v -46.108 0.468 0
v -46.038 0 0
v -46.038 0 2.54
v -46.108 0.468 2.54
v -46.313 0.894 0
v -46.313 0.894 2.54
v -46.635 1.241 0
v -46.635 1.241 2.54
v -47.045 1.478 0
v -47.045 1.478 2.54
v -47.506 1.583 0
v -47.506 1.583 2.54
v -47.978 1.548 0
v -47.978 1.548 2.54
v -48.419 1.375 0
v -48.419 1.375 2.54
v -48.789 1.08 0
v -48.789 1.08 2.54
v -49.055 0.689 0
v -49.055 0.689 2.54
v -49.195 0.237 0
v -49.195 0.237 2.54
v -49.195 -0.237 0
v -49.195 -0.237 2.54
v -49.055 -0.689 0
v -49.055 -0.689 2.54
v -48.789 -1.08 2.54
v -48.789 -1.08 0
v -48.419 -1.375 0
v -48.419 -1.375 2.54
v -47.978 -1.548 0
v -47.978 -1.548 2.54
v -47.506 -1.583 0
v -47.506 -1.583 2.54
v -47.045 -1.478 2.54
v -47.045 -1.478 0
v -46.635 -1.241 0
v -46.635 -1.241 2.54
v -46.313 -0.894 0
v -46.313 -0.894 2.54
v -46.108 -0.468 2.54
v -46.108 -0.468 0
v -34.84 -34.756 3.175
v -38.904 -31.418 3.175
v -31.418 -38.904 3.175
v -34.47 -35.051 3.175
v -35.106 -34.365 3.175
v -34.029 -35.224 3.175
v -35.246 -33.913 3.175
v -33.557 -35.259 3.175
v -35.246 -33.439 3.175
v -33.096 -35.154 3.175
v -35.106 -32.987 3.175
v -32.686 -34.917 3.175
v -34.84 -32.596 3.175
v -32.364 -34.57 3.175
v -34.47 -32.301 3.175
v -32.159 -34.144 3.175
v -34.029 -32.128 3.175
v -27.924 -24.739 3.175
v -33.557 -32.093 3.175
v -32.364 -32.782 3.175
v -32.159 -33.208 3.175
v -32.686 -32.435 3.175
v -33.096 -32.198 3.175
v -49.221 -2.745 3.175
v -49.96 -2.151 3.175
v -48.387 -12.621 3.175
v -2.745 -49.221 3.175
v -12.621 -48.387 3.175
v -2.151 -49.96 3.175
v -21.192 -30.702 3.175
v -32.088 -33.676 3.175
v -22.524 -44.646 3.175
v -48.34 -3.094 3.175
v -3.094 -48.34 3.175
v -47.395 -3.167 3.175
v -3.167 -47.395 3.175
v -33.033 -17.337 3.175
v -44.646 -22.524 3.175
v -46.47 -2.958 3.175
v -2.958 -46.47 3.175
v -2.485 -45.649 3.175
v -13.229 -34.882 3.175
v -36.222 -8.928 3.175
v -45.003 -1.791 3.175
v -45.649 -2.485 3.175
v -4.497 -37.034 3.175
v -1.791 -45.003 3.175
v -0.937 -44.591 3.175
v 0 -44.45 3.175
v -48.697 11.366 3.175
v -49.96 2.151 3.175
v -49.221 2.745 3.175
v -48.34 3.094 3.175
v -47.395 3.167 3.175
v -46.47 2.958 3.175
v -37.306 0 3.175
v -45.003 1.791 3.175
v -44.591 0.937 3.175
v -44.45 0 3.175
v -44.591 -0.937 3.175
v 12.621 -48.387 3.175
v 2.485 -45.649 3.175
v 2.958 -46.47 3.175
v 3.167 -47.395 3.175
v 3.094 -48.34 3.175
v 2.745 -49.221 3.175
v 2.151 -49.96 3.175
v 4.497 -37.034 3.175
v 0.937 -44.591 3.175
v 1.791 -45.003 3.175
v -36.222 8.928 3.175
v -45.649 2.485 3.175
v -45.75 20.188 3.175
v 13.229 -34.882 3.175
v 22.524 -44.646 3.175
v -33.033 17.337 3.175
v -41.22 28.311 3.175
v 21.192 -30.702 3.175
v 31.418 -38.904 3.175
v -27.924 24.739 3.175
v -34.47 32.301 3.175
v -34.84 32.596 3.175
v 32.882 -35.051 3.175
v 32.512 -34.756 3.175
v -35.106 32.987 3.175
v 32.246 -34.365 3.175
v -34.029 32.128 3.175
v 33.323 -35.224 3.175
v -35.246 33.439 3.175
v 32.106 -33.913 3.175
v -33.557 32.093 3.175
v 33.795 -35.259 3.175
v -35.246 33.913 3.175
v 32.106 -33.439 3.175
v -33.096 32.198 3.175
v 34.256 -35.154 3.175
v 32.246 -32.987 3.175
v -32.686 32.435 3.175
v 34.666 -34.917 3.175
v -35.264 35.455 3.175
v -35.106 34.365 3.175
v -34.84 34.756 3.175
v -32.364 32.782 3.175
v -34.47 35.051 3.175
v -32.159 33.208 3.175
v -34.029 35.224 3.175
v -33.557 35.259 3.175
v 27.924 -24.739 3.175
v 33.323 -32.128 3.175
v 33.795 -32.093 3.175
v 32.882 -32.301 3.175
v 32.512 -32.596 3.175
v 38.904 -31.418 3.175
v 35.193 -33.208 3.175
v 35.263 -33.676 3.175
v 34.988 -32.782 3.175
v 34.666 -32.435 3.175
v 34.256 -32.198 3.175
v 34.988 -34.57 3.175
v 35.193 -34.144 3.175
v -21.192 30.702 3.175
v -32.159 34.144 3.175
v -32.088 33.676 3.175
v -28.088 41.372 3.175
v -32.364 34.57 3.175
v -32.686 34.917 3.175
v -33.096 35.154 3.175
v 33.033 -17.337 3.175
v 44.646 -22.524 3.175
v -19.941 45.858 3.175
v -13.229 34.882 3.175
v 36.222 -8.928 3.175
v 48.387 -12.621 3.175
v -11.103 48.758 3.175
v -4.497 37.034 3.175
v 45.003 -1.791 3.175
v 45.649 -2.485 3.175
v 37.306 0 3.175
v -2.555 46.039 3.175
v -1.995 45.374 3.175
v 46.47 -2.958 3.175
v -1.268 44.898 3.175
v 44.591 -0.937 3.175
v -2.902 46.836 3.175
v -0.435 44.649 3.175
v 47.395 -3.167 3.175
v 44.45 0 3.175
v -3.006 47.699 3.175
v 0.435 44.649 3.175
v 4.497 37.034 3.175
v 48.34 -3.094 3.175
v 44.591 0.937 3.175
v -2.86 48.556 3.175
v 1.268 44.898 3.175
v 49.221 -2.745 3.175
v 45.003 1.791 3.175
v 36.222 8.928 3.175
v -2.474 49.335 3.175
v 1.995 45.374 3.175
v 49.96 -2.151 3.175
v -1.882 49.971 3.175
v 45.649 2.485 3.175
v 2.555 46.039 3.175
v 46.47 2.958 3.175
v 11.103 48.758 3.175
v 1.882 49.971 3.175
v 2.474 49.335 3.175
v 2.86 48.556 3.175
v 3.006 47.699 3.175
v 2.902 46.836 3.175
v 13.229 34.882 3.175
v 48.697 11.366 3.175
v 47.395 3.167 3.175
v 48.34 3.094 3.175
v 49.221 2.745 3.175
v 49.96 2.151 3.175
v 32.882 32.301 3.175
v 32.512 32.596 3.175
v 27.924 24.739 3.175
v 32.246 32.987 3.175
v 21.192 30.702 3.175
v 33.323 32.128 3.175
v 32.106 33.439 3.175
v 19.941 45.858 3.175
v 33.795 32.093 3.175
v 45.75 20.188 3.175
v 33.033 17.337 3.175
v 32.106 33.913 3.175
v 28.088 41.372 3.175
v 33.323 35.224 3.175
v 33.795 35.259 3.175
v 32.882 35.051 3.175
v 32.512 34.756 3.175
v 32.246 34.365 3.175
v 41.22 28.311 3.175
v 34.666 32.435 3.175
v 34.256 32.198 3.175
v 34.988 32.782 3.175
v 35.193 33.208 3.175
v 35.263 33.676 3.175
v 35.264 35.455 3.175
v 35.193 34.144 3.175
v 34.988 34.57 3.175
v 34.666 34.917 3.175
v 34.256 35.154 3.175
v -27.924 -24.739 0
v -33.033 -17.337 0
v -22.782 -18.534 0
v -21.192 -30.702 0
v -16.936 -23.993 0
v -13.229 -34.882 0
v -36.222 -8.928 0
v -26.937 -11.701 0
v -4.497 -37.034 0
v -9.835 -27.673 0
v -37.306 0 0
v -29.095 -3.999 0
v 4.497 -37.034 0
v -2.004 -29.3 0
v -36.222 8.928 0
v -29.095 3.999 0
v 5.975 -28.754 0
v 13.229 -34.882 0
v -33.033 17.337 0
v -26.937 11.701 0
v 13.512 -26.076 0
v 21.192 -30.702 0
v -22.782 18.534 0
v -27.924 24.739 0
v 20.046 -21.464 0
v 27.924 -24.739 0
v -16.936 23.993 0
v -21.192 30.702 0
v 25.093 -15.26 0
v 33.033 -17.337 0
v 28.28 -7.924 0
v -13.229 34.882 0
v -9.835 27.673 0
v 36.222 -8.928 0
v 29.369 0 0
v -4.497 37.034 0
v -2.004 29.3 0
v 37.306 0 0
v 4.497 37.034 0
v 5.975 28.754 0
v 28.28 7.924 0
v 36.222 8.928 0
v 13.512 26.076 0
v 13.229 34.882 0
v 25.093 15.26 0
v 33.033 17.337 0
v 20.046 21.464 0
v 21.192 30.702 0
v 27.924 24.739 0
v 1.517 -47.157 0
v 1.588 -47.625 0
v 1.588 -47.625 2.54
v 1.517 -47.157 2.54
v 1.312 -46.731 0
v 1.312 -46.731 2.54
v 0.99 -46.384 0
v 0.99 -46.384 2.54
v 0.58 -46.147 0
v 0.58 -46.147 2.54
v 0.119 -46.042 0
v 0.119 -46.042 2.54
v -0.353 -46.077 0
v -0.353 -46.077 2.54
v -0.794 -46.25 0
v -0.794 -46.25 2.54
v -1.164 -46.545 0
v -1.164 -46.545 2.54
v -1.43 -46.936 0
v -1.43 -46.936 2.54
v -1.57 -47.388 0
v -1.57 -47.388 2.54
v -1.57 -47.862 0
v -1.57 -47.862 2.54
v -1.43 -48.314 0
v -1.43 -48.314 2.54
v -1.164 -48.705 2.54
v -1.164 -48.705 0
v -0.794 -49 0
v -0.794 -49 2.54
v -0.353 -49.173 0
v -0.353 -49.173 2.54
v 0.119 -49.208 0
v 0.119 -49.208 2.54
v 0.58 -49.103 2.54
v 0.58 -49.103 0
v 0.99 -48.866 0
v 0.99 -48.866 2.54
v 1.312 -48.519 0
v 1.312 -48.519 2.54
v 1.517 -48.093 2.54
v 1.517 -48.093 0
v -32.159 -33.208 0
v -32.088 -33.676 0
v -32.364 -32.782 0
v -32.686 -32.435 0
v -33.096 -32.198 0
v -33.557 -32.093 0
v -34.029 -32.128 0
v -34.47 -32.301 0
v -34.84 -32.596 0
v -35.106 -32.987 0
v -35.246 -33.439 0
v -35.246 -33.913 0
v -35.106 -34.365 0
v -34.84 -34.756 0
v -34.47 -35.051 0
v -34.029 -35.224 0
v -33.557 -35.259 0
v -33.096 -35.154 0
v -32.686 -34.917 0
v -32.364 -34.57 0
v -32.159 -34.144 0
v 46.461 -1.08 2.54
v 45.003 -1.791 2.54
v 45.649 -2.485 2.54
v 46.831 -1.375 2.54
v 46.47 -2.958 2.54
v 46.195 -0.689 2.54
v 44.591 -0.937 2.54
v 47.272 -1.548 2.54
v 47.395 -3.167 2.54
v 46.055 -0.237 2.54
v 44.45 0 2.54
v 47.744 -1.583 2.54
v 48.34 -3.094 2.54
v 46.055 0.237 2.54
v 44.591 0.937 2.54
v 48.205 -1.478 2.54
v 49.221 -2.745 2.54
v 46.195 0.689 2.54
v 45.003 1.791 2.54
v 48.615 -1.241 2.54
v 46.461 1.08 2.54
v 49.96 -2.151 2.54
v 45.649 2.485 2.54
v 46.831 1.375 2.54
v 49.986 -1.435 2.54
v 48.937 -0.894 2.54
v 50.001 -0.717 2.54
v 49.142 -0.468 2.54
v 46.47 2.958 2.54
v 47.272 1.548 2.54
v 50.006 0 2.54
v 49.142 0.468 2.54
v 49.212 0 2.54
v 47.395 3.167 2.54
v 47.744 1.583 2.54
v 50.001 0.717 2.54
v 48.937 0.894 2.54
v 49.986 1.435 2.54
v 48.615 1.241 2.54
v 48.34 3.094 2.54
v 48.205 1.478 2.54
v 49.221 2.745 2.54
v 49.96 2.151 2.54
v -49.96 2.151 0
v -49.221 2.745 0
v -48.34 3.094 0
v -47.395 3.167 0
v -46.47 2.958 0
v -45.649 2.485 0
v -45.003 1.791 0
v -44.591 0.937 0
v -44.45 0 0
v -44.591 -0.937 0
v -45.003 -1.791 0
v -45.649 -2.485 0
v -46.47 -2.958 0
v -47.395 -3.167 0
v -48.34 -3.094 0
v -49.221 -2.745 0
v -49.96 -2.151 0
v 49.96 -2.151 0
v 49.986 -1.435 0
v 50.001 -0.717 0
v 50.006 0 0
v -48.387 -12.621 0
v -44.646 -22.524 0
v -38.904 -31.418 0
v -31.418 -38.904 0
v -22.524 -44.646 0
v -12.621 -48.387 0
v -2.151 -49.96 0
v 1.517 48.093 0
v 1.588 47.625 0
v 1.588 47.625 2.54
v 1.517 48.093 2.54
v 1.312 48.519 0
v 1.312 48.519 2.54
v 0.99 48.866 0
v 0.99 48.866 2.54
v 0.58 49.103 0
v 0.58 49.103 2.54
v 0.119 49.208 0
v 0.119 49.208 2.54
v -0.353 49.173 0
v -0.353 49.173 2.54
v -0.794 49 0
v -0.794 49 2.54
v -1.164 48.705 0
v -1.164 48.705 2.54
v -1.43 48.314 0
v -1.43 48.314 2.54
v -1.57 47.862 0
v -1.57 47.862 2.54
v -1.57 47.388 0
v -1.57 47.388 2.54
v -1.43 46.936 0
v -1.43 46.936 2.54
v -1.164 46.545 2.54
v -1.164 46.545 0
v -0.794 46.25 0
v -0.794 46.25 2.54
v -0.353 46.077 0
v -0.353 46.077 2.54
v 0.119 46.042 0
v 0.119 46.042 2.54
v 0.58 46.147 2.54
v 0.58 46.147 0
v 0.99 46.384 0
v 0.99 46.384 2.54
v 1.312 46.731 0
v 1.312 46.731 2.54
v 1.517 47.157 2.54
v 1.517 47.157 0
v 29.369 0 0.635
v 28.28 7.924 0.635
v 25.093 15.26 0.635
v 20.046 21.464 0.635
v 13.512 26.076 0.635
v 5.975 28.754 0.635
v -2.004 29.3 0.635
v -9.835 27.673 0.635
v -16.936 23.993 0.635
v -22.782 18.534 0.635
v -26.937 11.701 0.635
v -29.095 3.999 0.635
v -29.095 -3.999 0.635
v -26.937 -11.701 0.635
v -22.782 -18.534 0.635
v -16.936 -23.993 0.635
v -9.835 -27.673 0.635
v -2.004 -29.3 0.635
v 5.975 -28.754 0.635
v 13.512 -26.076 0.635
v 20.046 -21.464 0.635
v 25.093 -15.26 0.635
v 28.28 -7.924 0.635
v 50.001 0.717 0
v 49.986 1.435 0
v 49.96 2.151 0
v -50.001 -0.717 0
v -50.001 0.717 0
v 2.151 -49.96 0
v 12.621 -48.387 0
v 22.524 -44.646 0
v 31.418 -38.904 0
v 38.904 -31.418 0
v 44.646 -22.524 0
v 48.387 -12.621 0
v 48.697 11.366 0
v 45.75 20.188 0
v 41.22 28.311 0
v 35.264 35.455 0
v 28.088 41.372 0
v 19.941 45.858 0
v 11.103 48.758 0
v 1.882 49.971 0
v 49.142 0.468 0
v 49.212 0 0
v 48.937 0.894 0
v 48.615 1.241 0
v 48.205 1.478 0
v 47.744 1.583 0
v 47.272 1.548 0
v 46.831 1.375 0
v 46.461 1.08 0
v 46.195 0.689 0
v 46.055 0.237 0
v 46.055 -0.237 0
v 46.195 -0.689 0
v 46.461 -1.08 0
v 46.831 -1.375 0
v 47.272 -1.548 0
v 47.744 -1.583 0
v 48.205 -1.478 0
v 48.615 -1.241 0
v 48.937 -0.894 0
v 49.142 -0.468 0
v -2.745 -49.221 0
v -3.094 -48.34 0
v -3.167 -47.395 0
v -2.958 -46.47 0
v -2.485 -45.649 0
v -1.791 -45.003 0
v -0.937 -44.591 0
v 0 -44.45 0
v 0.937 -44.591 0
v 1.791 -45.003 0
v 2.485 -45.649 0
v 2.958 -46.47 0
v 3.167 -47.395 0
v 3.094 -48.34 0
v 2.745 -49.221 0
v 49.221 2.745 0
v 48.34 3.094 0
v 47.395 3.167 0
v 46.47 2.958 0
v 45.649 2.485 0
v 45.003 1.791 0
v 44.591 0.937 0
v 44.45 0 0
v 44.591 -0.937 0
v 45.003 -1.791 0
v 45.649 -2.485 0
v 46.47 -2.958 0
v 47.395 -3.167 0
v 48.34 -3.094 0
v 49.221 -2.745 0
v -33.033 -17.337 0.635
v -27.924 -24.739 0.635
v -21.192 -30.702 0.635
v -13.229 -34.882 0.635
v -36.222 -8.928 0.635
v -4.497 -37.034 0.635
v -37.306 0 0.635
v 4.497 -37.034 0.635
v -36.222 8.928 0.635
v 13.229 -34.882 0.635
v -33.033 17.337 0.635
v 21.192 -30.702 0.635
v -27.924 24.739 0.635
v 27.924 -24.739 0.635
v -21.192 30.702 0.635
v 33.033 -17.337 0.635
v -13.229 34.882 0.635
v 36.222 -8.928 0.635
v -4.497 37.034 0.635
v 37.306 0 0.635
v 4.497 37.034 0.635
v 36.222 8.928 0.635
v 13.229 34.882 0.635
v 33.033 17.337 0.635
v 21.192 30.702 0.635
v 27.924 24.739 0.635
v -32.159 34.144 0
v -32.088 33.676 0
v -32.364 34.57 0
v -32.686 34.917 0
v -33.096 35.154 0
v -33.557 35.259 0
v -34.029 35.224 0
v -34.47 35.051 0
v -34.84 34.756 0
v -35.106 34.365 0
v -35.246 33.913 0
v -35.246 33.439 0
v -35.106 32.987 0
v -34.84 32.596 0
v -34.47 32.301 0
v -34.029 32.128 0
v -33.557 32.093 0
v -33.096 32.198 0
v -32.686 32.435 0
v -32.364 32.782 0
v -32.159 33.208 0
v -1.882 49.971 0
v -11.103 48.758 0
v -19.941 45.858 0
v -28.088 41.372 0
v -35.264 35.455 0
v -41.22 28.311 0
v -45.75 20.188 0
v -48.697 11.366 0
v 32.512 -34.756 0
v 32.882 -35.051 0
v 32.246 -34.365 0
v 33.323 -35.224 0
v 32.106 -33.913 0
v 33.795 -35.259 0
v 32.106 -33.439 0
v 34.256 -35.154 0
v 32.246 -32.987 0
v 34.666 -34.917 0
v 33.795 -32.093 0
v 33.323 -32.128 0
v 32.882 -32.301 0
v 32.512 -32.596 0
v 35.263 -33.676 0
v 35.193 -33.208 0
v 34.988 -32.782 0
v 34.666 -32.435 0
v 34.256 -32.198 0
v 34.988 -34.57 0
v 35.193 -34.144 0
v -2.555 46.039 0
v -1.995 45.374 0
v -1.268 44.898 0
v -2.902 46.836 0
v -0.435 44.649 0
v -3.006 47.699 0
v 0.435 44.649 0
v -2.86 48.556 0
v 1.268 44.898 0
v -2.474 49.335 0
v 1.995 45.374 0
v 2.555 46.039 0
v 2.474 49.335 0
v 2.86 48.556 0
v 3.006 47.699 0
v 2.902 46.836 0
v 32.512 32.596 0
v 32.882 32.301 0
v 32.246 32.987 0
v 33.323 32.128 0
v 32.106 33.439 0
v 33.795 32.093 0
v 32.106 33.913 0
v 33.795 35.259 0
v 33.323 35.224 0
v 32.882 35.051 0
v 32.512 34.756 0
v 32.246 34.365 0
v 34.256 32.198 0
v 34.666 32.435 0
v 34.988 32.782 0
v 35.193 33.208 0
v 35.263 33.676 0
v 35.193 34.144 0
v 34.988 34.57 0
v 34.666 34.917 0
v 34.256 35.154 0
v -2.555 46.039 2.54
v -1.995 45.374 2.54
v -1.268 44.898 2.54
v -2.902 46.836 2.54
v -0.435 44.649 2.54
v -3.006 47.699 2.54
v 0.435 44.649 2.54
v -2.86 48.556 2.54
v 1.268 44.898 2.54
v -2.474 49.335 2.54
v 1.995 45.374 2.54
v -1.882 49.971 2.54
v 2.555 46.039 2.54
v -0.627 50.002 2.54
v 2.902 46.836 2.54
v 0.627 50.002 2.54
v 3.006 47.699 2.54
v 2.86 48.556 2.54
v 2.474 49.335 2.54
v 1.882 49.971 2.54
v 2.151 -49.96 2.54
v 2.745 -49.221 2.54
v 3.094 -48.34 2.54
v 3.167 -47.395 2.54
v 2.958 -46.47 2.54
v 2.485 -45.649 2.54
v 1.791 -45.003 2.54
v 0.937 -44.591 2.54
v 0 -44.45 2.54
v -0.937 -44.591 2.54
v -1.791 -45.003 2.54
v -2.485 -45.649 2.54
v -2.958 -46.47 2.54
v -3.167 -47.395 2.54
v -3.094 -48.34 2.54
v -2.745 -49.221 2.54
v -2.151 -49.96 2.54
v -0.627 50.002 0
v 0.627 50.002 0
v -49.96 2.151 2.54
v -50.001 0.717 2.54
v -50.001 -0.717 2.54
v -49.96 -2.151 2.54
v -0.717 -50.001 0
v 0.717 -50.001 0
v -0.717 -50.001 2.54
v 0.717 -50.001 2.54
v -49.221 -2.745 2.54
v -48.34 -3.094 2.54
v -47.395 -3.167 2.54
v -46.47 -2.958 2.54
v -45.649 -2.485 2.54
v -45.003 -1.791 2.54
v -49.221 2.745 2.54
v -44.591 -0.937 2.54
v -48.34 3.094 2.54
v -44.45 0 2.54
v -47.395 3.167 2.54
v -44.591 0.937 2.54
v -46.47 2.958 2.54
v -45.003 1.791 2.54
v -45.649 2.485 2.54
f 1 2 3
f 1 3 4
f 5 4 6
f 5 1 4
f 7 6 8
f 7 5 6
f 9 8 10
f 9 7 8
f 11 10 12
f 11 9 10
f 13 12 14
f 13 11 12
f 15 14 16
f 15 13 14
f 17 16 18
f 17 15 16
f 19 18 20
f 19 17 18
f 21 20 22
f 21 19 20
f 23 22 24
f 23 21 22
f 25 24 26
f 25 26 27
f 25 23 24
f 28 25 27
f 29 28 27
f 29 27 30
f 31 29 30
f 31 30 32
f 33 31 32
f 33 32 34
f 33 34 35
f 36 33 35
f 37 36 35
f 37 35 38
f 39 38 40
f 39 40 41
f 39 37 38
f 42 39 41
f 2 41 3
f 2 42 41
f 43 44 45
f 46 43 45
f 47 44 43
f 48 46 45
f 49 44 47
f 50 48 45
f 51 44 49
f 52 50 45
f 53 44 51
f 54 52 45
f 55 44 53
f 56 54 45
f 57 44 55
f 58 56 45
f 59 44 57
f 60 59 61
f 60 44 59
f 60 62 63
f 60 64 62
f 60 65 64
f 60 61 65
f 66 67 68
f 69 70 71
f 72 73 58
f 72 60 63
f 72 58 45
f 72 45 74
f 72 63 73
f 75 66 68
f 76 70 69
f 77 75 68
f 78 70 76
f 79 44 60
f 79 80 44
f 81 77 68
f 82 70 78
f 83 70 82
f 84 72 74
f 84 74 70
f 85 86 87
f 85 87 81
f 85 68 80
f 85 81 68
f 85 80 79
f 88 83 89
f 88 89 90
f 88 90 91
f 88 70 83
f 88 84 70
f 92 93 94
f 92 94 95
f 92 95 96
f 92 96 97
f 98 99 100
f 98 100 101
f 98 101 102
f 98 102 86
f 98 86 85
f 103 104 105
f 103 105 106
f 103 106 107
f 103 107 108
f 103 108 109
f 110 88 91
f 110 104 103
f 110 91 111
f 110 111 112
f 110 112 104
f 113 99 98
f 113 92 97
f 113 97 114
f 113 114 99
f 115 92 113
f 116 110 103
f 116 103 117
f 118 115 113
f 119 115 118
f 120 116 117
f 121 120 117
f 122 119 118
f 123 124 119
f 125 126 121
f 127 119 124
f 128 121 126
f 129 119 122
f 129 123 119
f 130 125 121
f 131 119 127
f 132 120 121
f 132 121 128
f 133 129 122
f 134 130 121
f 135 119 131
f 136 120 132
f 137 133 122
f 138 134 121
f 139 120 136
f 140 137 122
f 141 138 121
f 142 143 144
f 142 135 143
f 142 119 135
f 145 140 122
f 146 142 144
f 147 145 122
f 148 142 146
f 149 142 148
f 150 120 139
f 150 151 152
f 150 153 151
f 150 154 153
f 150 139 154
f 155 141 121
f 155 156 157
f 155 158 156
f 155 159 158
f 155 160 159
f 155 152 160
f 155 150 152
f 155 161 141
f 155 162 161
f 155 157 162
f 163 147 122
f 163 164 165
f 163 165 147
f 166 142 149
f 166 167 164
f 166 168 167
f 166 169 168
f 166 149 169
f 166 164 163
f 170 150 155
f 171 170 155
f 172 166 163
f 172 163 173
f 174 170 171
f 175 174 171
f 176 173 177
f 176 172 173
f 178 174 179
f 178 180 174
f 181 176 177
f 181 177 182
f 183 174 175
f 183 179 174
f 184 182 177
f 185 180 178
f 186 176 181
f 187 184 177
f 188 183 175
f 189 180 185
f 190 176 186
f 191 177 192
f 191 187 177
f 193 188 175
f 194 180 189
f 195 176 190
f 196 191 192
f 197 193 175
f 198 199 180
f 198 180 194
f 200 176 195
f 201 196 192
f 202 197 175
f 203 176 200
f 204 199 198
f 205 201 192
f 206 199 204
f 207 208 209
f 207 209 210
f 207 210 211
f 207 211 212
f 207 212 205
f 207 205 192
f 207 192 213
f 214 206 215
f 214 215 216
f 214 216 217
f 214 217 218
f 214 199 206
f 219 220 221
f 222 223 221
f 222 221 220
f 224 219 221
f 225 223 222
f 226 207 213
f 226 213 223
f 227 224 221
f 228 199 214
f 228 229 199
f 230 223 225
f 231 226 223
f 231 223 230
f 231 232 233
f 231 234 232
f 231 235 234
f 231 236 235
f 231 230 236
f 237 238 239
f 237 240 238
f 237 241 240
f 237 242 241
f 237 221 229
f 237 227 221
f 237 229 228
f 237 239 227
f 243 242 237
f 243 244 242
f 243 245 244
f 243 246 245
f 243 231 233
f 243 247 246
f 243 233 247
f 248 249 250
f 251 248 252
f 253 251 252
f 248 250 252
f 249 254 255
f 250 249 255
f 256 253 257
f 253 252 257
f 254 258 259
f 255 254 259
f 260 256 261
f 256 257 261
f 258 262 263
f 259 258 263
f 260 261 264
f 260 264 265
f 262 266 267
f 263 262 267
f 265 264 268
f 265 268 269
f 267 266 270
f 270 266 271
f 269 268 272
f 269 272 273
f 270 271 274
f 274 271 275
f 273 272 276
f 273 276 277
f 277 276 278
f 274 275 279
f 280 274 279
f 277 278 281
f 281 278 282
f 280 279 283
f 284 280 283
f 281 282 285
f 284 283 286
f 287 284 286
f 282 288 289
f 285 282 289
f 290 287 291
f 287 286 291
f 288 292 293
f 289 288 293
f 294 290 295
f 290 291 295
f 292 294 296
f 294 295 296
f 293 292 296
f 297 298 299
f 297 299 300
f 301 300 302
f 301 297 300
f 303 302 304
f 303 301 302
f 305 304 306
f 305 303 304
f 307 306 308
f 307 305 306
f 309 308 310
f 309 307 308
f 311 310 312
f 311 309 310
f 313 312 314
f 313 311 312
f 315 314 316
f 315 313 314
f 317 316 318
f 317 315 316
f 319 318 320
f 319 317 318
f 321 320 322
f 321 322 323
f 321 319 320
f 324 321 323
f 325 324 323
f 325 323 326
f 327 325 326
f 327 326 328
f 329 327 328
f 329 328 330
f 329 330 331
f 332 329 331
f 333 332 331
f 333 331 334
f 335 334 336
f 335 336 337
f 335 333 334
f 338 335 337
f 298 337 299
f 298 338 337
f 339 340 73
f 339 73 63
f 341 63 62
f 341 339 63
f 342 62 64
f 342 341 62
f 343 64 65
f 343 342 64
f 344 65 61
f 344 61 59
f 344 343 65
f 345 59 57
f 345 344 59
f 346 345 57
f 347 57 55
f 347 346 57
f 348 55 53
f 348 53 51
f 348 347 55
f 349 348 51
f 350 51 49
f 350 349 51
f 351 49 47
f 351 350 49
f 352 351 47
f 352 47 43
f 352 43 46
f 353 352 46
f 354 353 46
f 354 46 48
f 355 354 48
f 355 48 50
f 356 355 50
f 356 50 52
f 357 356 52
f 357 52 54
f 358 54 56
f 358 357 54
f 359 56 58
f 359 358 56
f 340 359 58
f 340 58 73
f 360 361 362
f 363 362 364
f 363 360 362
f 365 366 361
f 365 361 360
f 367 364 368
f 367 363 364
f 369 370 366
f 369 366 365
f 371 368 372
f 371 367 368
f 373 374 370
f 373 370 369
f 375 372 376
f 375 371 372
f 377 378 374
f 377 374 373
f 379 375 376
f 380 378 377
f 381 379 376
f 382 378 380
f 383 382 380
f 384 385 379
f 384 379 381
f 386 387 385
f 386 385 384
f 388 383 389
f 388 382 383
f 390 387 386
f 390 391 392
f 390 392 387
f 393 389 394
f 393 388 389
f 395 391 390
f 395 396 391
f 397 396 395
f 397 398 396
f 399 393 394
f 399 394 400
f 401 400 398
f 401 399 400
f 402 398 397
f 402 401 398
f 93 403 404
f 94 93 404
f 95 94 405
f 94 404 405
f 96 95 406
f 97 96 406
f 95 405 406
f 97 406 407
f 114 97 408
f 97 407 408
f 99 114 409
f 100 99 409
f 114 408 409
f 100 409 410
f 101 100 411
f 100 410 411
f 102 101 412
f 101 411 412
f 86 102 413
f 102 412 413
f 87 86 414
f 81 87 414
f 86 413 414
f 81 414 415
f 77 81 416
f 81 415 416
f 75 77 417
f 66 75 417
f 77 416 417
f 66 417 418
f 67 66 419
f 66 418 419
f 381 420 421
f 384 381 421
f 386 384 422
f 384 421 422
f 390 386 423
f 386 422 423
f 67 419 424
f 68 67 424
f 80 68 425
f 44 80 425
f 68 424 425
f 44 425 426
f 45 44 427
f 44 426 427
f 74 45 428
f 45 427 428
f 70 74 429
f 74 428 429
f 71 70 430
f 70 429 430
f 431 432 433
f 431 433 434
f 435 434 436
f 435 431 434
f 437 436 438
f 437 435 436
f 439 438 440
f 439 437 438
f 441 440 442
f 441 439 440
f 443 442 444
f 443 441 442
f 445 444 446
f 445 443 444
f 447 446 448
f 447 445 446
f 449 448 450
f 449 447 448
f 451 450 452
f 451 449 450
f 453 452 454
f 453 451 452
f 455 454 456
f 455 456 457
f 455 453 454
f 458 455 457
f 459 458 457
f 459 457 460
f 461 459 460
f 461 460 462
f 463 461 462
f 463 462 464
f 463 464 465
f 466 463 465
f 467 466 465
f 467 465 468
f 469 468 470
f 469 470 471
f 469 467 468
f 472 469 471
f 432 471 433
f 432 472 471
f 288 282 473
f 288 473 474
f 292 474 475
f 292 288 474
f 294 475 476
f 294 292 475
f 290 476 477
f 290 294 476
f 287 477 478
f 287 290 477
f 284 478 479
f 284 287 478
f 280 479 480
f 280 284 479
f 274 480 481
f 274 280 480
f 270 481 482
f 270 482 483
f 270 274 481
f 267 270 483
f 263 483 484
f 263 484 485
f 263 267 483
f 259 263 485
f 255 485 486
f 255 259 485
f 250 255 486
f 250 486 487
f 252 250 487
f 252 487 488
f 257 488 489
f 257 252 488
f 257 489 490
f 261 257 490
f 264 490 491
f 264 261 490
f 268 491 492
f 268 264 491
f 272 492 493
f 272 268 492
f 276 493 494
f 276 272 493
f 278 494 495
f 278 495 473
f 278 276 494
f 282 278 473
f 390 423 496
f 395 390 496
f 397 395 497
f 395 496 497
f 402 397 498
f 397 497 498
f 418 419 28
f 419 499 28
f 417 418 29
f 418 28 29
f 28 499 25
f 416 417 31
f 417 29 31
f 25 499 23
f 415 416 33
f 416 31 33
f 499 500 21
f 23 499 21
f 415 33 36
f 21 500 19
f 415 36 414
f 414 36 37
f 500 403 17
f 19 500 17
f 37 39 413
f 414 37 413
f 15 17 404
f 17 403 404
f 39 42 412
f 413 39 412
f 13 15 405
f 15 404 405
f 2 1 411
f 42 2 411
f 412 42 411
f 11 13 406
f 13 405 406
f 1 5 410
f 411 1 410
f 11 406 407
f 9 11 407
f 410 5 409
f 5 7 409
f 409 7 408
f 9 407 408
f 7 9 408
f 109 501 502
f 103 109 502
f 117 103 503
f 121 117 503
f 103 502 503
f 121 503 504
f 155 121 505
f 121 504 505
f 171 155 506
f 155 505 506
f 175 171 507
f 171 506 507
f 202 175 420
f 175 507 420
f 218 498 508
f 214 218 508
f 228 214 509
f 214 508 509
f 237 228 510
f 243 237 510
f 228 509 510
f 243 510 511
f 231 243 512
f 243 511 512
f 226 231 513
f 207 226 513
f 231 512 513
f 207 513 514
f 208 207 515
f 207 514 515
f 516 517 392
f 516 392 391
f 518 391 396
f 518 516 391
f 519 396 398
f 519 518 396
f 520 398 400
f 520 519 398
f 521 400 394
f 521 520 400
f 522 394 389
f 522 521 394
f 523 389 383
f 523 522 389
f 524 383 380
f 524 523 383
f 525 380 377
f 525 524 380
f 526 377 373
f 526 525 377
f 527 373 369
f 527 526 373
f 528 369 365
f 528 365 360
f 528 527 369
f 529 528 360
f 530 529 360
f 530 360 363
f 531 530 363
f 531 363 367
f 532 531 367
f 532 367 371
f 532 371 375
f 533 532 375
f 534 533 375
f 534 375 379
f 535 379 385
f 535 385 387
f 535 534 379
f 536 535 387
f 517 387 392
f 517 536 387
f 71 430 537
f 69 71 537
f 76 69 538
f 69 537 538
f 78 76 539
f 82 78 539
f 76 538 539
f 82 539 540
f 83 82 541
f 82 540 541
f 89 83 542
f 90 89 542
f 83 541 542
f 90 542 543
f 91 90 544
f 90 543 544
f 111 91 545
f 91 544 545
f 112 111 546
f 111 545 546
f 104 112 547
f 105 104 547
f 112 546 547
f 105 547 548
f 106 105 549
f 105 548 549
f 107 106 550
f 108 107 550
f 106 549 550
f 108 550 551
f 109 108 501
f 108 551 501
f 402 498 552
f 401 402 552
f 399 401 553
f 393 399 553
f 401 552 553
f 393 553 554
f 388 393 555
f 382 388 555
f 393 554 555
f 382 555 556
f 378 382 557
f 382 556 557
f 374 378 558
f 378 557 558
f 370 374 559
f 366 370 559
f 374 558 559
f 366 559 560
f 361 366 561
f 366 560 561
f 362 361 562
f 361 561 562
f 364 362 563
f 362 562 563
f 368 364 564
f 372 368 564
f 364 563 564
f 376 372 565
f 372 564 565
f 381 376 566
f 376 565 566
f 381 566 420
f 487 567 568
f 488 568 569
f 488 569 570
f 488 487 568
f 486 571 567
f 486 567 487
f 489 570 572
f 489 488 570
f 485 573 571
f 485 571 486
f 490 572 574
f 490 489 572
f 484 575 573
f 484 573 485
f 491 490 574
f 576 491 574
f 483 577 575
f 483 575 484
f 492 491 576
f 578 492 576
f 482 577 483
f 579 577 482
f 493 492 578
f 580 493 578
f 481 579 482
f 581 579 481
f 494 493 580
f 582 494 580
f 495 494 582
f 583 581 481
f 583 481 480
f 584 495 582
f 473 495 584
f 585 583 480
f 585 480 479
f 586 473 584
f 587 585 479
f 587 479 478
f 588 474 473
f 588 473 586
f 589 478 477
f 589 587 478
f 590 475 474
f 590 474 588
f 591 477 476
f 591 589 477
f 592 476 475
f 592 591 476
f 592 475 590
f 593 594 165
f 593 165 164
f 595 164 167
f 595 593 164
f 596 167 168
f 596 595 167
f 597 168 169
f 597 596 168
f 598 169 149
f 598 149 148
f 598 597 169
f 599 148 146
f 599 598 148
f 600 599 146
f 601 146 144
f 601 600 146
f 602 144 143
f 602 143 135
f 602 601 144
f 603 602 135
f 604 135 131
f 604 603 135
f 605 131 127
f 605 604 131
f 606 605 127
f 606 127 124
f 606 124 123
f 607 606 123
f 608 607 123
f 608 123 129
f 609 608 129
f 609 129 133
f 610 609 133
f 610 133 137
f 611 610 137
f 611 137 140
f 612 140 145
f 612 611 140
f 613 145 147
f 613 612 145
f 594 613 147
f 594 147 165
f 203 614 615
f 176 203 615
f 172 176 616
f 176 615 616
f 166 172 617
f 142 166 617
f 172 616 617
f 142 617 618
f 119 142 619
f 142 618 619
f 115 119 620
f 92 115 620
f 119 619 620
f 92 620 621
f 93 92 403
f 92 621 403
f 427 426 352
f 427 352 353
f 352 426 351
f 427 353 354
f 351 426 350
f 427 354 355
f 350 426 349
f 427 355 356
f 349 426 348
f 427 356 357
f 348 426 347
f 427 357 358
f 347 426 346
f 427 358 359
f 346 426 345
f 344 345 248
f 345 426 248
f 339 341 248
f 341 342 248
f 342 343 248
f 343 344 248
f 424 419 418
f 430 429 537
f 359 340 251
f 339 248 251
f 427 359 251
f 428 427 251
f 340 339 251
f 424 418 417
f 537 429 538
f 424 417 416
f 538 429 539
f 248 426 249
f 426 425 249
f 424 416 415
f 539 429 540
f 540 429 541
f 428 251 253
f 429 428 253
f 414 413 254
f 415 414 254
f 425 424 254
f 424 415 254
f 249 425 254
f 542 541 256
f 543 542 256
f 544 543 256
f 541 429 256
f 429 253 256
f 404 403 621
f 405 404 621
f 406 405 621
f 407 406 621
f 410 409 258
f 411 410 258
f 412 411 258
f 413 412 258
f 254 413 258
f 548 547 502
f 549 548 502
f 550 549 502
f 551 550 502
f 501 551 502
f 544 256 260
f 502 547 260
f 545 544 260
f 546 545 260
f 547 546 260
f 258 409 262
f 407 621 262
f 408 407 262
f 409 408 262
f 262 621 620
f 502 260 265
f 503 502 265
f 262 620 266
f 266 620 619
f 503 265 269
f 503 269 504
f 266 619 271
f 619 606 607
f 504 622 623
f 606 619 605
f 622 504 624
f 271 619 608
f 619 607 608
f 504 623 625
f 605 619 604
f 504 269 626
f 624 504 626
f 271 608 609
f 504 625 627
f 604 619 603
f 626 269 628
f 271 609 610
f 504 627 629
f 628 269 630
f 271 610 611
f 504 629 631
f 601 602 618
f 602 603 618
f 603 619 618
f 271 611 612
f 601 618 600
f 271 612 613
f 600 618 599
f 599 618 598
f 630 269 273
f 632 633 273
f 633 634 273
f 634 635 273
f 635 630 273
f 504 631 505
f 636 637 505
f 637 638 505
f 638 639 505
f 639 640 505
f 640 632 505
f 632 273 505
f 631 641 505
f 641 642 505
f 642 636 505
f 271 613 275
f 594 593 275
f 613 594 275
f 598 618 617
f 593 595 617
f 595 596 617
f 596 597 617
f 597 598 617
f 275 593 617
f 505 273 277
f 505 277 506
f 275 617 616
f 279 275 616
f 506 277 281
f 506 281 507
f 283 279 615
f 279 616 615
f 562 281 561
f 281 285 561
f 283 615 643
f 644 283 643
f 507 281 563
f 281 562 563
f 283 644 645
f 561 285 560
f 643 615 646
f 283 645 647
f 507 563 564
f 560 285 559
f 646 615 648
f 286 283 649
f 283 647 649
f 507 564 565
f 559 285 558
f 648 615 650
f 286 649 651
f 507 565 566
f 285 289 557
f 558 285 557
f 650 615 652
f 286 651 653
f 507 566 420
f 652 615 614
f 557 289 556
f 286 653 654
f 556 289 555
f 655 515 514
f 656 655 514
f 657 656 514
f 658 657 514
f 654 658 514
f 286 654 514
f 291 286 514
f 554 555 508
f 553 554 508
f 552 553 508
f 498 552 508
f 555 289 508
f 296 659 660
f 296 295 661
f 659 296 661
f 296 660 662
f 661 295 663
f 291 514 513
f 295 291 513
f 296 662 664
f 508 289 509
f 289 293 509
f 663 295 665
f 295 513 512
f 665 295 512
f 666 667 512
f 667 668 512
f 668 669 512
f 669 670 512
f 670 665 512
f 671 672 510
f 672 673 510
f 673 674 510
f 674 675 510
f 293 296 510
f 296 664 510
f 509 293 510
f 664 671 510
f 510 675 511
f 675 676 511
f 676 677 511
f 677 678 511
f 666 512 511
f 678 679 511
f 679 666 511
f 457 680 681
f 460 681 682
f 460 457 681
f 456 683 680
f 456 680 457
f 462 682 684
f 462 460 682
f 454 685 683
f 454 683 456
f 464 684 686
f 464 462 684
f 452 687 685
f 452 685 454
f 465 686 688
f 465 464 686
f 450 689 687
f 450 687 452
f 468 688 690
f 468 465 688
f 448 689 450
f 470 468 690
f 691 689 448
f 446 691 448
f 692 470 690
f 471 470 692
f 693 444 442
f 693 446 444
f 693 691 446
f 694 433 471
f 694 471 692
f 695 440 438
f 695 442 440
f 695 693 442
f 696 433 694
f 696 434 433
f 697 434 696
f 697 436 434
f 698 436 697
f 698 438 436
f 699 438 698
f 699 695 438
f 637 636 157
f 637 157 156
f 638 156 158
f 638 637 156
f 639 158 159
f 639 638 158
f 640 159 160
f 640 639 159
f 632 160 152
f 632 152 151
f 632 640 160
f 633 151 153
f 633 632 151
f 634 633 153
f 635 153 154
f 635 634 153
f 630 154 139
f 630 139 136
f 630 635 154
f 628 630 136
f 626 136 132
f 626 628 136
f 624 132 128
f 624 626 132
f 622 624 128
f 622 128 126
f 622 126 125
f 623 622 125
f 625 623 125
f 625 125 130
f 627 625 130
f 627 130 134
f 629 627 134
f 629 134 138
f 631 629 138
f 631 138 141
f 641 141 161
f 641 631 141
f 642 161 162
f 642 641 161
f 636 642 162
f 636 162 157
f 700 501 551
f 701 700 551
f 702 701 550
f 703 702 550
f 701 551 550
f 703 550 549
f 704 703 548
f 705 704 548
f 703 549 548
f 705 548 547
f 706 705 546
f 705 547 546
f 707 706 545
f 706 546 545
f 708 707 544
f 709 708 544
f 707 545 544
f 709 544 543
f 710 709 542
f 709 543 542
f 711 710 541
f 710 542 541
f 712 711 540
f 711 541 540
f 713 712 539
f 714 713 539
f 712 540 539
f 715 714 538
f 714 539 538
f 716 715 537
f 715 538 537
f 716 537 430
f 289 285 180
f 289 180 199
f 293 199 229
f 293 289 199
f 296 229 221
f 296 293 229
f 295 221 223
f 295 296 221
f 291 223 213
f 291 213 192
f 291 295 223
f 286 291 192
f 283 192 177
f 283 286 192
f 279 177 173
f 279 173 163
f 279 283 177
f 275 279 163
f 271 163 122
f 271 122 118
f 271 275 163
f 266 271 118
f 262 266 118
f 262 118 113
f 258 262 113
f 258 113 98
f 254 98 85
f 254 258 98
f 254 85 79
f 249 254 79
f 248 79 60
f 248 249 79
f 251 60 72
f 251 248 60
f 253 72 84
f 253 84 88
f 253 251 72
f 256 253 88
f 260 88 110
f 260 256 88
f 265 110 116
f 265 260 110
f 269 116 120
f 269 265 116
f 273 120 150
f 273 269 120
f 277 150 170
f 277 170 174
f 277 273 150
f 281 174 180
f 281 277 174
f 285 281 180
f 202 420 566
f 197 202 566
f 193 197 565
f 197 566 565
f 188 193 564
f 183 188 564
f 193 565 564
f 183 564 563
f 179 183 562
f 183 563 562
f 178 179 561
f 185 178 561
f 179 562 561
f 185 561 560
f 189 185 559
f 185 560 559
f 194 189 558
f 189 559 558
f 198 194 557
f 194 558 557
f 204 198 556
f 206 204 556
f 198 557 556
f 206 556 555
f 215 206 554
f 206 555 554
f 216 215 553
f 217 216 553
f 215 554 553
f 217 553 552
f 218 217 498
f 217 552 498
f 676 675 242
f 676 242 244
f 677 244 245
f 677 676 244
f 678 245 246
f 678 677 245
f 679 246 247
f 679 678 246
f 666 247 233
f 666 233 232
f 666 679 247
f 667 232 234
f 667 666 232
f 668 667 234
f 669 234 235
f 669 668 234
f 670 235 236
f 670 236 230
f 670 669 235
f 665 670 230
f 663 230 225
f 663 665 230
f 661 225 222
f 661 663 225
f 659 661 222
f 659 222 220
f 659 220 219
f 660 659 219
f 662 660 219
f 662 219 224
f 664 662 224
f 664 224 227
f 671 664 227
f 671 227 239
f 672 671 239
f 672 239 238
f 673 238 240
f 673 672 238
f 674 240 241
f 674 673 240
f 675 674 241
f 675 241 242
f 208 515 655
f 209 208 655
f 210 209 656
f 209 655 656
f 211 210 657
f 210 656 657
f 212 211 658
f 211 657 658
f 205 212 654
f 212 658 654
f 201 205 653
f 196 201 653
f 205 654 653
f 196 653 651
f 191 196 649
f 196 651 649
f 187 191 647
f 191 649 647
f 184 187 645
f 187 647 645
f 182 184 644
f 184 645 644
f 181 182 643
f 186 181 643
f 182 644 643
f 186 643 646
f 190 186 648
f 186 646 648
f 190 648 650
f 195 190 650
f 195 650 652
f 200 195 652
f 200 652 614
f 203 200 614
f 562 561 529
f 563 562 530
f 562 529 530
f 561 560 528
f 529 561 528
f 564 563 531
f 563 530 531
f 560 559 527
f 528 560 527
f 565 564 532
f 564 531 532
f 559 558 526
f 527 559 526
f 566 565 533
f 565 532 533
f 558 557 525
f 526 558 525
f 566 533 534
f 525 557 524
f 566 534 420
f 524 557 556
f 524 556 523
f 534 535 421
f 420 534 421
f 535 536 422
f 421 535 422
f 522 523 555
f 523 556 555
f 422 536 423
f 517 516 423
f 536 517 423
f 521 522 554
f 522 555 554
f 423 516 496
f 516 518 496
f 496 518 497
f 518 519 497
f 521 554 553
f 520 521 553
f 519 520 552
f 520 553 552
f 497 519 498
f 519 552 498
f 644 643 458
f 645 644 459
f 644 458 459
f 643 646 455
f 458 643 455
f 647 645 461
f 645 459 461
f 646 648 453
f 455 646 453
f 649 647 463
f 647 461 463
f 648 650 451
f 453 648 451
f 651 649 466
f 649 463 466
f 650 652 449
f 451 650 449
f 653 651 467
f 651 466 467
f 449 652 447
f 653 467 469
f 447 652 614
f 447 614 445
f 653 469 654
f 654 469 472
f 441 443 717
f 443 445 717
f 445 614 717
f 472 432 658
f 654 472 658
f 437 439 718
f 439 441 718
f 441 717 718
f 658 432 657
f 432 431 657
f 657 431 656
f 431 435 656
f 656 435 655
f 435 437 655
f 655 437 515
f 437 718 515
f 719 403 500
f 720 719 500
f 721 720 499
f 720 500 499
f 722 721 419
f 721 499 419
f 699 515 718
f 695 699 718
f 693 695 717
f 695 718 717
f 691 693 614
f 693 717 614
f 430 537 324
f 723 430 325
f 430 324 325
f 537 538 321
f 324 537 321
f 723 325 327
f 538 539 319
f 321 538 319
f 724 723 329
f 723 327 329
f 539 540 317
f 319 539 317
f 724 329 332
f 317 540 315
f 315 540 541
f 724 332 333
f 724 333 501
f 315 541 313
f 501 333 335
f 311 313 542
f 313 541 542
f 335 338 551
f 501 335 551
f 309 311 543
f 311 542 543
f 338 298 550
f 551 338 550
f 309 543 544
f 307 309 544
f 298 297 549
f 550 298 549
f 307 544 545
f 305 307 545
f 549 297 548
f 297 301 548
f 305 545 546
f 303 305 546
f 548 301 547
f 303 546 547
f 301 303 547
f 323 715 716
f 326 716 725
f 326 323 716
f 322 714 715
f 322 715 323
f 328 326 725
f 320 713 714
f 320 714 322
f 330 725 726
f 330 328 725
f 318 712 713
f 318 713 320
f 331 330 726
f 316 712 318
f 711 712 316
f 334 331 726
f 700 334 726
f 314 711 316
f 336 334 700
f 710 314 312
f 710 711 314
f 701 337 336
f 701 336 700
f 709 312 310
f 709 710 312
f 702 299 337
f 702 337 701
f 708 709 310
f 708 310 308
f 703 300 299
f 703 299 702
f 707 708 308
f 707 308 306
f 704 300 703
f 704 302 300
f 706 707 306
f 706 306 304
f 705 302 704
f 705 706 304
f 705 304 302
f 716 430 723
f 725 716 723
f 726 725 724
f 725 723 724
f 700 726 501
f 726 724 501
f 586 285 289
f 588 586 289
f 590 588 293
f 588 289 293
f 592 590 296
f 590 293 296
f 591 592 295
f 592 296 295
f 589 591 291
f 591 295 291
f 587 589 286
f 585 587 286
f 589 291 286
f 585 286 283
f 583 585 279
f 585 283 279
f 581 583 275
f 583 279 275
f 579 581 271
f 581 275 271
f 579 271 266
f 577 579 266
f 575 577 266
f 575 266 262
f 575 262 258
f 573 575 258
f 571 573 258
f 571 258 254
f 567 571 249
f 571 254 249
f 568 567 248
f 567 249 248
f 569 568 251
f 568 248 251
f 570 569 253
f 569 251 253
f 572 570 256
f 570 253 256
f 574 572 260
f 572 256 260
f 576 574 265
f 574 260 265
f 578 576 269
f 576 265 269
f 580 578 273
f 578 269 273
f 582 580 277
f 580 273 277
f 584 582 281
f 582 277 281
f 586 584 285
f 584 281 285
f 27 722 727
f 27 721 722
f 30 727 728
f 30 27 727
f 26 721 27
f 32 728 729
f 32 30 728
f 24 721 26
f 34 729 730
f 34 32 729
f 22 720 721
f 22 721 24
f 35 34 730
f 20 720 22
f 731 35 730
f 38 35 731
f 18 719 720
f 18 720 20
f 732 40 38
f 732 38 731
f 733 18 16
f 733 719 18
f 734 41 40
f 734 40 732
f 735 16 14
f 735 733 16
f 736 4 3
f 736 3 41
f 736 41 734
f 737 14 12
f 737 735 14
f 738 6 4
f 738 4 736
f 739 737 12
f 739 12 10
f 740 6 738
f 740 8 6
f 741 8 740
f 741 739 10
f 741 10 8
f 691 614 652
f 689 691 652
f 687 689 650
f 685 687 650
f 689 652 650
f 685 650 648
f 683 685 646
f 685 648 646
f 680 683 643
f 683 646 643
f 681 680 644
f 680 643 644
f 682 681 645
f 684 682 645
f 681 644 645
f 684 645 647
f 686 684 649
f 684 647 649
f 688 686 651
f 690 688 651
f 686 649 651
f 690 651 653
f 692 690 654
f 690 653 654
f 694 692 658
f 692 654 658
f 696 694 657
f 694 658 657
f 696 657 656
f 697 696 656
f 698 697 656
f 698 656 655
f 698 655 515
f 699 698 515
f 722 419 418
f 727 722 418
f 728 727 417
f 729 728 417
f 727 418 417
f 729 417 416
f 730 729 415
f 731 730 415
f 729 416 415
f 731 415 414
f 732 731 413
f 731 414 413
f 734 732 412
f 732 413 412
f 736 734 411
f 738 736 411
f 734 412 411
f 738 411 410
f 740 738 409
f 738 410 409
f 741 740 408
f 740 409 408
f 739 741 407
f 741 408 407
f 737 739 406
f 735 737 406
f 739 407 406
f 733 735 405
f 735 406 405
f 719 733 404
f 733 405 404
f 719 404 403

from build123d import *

# Parameters (mm, degrees)
F0_R     = 1.5875
F1_DEPTH = 2.54
F0_R_2   = 37.30625
F0_R_3   = 29.36875
F2_DEPTH = 0.635
F3_DEPTH = 3.175


with BuildPart() as f1:
    # F0 (on Top) → F1 (new body)
    with BuildSketch(Plane.XY):
        with BuildLine():
            ThreePointArc((-1.88189, 49.970827), (0, 44.617607), (1.88189, 49.970827))
            ThreePointArc((1.88189, 49.970827), (0, 50.00625), (-1.88189, 49.970827))
        make_face()
        with Locations((0, 47.625)):
            Circle(F0_R, mode=Mode.SUBTRACT)
        with BuildLine():
            ThreePointArc((-49.959948, -2.151428), (-44.45, 0), (-49.959948, 2.151428))
            ThreePointArc((-49.959948, 2.151428), (-50.00625, 0), (-49.959948, -2.151428))
        make_face()
        with Locations((-47.625, 0)):
            Circle(F0_R, mode=Mode.SUBTRACT)
        with BuildLine():
            ThreePointArc((-2.151428, -49.959948), (0, -50.00625), (2.151428, -49.959948))
            ThreePointArc((2.151428, -49.959948), (0, -44.45), (-2.151428, -49.959948))
        make_face()
        with Locations((0, -47.625)):
            Circle(F0_R, mode=Mode.SUBTRACT)
        with BuildLine():
            ThreePointArc((49.959948, -2.151428), (49.994673, -1.075963), (50.00625, 0))
            ThreePointArc((50.00625, 0), (49.994673, 1.075963), (49.959948, 2.151428))
            ThreePointArc((49.959948, 2.151428), (44.45, 0), (49.959948, -2.151428))
        make_face()
        with Locations((47.625, 0)):
            Circle(F0_R, mode=Mode.SUBTRACT)
    extrude(amount=F1_DEPTH)


with BuildPart() as f2:
    # F0 (on Top) → F2 (new body)
    with BuildSketch(Plane.XY):
        Circle(F0_R_2)
        Circle(F0_R_3, mode=Mode.SUBTRACT)
    extrude(amount=F2_DEPTH)


with BuildPart() as f3:
    # F0 (on Top) → F3 (new body)
    with BuildSketch(Plane.XY):
        with BuildLine():
            ThreePointArc((49.959948, -2.151428), (44.45, 0), (49.959948, 2.151428))
            ThreePointArc((49.959948, 2.151428), (35.264256, 35.455004), (1.88189, 49.970827))
            ThreePointArc((1.88189, 49.970827), (0, 44.617607), (-1.88189, 49.970827))
            ThreePointArc((-1.88189, 49.970827), (-35.264256, 35.455004), (-49.959948, 2.151428))
            ThreePointArc((-49.959948, 2.151428), (-44.45, 0), (-49.959948, -2.151428))
            ThreePointArc((-49.959948, -2.151428), (-35.359758, -35.359758), (-2.151428, -49.959948))
            ThreePointArc((-2.151428, -49.959948), (0, -44.45), (2.151428, -49.959948))
            ThreePointArc((2.151428, -49.959948), (35.359758, -35.359758), (49.959948, -2.151428))
        make_face()
        with Locations((-33.67596, -33.67596)):
            Circle(F0_R, mode=Mode.SUBTRACT)
        Circle(F0_R_2, mode=Mode.SUBTRACT)
        with Locations((33.67596, -33.67596)):
            Circle(F0_R, mode=Mode.SUBTRACT)
        with Locations((-33.67596, 33.67596)):
            Circle(F0_R, mode=Mode.SUBTRACT)
        with Locations((33.67596, 33.67596)):
            Circle(F0_R, mode=Mode.SUBTRACT)
    extrude(amount=F3_DEPTH)


solid = Compound([f1.part, f2.part, f3.part])
